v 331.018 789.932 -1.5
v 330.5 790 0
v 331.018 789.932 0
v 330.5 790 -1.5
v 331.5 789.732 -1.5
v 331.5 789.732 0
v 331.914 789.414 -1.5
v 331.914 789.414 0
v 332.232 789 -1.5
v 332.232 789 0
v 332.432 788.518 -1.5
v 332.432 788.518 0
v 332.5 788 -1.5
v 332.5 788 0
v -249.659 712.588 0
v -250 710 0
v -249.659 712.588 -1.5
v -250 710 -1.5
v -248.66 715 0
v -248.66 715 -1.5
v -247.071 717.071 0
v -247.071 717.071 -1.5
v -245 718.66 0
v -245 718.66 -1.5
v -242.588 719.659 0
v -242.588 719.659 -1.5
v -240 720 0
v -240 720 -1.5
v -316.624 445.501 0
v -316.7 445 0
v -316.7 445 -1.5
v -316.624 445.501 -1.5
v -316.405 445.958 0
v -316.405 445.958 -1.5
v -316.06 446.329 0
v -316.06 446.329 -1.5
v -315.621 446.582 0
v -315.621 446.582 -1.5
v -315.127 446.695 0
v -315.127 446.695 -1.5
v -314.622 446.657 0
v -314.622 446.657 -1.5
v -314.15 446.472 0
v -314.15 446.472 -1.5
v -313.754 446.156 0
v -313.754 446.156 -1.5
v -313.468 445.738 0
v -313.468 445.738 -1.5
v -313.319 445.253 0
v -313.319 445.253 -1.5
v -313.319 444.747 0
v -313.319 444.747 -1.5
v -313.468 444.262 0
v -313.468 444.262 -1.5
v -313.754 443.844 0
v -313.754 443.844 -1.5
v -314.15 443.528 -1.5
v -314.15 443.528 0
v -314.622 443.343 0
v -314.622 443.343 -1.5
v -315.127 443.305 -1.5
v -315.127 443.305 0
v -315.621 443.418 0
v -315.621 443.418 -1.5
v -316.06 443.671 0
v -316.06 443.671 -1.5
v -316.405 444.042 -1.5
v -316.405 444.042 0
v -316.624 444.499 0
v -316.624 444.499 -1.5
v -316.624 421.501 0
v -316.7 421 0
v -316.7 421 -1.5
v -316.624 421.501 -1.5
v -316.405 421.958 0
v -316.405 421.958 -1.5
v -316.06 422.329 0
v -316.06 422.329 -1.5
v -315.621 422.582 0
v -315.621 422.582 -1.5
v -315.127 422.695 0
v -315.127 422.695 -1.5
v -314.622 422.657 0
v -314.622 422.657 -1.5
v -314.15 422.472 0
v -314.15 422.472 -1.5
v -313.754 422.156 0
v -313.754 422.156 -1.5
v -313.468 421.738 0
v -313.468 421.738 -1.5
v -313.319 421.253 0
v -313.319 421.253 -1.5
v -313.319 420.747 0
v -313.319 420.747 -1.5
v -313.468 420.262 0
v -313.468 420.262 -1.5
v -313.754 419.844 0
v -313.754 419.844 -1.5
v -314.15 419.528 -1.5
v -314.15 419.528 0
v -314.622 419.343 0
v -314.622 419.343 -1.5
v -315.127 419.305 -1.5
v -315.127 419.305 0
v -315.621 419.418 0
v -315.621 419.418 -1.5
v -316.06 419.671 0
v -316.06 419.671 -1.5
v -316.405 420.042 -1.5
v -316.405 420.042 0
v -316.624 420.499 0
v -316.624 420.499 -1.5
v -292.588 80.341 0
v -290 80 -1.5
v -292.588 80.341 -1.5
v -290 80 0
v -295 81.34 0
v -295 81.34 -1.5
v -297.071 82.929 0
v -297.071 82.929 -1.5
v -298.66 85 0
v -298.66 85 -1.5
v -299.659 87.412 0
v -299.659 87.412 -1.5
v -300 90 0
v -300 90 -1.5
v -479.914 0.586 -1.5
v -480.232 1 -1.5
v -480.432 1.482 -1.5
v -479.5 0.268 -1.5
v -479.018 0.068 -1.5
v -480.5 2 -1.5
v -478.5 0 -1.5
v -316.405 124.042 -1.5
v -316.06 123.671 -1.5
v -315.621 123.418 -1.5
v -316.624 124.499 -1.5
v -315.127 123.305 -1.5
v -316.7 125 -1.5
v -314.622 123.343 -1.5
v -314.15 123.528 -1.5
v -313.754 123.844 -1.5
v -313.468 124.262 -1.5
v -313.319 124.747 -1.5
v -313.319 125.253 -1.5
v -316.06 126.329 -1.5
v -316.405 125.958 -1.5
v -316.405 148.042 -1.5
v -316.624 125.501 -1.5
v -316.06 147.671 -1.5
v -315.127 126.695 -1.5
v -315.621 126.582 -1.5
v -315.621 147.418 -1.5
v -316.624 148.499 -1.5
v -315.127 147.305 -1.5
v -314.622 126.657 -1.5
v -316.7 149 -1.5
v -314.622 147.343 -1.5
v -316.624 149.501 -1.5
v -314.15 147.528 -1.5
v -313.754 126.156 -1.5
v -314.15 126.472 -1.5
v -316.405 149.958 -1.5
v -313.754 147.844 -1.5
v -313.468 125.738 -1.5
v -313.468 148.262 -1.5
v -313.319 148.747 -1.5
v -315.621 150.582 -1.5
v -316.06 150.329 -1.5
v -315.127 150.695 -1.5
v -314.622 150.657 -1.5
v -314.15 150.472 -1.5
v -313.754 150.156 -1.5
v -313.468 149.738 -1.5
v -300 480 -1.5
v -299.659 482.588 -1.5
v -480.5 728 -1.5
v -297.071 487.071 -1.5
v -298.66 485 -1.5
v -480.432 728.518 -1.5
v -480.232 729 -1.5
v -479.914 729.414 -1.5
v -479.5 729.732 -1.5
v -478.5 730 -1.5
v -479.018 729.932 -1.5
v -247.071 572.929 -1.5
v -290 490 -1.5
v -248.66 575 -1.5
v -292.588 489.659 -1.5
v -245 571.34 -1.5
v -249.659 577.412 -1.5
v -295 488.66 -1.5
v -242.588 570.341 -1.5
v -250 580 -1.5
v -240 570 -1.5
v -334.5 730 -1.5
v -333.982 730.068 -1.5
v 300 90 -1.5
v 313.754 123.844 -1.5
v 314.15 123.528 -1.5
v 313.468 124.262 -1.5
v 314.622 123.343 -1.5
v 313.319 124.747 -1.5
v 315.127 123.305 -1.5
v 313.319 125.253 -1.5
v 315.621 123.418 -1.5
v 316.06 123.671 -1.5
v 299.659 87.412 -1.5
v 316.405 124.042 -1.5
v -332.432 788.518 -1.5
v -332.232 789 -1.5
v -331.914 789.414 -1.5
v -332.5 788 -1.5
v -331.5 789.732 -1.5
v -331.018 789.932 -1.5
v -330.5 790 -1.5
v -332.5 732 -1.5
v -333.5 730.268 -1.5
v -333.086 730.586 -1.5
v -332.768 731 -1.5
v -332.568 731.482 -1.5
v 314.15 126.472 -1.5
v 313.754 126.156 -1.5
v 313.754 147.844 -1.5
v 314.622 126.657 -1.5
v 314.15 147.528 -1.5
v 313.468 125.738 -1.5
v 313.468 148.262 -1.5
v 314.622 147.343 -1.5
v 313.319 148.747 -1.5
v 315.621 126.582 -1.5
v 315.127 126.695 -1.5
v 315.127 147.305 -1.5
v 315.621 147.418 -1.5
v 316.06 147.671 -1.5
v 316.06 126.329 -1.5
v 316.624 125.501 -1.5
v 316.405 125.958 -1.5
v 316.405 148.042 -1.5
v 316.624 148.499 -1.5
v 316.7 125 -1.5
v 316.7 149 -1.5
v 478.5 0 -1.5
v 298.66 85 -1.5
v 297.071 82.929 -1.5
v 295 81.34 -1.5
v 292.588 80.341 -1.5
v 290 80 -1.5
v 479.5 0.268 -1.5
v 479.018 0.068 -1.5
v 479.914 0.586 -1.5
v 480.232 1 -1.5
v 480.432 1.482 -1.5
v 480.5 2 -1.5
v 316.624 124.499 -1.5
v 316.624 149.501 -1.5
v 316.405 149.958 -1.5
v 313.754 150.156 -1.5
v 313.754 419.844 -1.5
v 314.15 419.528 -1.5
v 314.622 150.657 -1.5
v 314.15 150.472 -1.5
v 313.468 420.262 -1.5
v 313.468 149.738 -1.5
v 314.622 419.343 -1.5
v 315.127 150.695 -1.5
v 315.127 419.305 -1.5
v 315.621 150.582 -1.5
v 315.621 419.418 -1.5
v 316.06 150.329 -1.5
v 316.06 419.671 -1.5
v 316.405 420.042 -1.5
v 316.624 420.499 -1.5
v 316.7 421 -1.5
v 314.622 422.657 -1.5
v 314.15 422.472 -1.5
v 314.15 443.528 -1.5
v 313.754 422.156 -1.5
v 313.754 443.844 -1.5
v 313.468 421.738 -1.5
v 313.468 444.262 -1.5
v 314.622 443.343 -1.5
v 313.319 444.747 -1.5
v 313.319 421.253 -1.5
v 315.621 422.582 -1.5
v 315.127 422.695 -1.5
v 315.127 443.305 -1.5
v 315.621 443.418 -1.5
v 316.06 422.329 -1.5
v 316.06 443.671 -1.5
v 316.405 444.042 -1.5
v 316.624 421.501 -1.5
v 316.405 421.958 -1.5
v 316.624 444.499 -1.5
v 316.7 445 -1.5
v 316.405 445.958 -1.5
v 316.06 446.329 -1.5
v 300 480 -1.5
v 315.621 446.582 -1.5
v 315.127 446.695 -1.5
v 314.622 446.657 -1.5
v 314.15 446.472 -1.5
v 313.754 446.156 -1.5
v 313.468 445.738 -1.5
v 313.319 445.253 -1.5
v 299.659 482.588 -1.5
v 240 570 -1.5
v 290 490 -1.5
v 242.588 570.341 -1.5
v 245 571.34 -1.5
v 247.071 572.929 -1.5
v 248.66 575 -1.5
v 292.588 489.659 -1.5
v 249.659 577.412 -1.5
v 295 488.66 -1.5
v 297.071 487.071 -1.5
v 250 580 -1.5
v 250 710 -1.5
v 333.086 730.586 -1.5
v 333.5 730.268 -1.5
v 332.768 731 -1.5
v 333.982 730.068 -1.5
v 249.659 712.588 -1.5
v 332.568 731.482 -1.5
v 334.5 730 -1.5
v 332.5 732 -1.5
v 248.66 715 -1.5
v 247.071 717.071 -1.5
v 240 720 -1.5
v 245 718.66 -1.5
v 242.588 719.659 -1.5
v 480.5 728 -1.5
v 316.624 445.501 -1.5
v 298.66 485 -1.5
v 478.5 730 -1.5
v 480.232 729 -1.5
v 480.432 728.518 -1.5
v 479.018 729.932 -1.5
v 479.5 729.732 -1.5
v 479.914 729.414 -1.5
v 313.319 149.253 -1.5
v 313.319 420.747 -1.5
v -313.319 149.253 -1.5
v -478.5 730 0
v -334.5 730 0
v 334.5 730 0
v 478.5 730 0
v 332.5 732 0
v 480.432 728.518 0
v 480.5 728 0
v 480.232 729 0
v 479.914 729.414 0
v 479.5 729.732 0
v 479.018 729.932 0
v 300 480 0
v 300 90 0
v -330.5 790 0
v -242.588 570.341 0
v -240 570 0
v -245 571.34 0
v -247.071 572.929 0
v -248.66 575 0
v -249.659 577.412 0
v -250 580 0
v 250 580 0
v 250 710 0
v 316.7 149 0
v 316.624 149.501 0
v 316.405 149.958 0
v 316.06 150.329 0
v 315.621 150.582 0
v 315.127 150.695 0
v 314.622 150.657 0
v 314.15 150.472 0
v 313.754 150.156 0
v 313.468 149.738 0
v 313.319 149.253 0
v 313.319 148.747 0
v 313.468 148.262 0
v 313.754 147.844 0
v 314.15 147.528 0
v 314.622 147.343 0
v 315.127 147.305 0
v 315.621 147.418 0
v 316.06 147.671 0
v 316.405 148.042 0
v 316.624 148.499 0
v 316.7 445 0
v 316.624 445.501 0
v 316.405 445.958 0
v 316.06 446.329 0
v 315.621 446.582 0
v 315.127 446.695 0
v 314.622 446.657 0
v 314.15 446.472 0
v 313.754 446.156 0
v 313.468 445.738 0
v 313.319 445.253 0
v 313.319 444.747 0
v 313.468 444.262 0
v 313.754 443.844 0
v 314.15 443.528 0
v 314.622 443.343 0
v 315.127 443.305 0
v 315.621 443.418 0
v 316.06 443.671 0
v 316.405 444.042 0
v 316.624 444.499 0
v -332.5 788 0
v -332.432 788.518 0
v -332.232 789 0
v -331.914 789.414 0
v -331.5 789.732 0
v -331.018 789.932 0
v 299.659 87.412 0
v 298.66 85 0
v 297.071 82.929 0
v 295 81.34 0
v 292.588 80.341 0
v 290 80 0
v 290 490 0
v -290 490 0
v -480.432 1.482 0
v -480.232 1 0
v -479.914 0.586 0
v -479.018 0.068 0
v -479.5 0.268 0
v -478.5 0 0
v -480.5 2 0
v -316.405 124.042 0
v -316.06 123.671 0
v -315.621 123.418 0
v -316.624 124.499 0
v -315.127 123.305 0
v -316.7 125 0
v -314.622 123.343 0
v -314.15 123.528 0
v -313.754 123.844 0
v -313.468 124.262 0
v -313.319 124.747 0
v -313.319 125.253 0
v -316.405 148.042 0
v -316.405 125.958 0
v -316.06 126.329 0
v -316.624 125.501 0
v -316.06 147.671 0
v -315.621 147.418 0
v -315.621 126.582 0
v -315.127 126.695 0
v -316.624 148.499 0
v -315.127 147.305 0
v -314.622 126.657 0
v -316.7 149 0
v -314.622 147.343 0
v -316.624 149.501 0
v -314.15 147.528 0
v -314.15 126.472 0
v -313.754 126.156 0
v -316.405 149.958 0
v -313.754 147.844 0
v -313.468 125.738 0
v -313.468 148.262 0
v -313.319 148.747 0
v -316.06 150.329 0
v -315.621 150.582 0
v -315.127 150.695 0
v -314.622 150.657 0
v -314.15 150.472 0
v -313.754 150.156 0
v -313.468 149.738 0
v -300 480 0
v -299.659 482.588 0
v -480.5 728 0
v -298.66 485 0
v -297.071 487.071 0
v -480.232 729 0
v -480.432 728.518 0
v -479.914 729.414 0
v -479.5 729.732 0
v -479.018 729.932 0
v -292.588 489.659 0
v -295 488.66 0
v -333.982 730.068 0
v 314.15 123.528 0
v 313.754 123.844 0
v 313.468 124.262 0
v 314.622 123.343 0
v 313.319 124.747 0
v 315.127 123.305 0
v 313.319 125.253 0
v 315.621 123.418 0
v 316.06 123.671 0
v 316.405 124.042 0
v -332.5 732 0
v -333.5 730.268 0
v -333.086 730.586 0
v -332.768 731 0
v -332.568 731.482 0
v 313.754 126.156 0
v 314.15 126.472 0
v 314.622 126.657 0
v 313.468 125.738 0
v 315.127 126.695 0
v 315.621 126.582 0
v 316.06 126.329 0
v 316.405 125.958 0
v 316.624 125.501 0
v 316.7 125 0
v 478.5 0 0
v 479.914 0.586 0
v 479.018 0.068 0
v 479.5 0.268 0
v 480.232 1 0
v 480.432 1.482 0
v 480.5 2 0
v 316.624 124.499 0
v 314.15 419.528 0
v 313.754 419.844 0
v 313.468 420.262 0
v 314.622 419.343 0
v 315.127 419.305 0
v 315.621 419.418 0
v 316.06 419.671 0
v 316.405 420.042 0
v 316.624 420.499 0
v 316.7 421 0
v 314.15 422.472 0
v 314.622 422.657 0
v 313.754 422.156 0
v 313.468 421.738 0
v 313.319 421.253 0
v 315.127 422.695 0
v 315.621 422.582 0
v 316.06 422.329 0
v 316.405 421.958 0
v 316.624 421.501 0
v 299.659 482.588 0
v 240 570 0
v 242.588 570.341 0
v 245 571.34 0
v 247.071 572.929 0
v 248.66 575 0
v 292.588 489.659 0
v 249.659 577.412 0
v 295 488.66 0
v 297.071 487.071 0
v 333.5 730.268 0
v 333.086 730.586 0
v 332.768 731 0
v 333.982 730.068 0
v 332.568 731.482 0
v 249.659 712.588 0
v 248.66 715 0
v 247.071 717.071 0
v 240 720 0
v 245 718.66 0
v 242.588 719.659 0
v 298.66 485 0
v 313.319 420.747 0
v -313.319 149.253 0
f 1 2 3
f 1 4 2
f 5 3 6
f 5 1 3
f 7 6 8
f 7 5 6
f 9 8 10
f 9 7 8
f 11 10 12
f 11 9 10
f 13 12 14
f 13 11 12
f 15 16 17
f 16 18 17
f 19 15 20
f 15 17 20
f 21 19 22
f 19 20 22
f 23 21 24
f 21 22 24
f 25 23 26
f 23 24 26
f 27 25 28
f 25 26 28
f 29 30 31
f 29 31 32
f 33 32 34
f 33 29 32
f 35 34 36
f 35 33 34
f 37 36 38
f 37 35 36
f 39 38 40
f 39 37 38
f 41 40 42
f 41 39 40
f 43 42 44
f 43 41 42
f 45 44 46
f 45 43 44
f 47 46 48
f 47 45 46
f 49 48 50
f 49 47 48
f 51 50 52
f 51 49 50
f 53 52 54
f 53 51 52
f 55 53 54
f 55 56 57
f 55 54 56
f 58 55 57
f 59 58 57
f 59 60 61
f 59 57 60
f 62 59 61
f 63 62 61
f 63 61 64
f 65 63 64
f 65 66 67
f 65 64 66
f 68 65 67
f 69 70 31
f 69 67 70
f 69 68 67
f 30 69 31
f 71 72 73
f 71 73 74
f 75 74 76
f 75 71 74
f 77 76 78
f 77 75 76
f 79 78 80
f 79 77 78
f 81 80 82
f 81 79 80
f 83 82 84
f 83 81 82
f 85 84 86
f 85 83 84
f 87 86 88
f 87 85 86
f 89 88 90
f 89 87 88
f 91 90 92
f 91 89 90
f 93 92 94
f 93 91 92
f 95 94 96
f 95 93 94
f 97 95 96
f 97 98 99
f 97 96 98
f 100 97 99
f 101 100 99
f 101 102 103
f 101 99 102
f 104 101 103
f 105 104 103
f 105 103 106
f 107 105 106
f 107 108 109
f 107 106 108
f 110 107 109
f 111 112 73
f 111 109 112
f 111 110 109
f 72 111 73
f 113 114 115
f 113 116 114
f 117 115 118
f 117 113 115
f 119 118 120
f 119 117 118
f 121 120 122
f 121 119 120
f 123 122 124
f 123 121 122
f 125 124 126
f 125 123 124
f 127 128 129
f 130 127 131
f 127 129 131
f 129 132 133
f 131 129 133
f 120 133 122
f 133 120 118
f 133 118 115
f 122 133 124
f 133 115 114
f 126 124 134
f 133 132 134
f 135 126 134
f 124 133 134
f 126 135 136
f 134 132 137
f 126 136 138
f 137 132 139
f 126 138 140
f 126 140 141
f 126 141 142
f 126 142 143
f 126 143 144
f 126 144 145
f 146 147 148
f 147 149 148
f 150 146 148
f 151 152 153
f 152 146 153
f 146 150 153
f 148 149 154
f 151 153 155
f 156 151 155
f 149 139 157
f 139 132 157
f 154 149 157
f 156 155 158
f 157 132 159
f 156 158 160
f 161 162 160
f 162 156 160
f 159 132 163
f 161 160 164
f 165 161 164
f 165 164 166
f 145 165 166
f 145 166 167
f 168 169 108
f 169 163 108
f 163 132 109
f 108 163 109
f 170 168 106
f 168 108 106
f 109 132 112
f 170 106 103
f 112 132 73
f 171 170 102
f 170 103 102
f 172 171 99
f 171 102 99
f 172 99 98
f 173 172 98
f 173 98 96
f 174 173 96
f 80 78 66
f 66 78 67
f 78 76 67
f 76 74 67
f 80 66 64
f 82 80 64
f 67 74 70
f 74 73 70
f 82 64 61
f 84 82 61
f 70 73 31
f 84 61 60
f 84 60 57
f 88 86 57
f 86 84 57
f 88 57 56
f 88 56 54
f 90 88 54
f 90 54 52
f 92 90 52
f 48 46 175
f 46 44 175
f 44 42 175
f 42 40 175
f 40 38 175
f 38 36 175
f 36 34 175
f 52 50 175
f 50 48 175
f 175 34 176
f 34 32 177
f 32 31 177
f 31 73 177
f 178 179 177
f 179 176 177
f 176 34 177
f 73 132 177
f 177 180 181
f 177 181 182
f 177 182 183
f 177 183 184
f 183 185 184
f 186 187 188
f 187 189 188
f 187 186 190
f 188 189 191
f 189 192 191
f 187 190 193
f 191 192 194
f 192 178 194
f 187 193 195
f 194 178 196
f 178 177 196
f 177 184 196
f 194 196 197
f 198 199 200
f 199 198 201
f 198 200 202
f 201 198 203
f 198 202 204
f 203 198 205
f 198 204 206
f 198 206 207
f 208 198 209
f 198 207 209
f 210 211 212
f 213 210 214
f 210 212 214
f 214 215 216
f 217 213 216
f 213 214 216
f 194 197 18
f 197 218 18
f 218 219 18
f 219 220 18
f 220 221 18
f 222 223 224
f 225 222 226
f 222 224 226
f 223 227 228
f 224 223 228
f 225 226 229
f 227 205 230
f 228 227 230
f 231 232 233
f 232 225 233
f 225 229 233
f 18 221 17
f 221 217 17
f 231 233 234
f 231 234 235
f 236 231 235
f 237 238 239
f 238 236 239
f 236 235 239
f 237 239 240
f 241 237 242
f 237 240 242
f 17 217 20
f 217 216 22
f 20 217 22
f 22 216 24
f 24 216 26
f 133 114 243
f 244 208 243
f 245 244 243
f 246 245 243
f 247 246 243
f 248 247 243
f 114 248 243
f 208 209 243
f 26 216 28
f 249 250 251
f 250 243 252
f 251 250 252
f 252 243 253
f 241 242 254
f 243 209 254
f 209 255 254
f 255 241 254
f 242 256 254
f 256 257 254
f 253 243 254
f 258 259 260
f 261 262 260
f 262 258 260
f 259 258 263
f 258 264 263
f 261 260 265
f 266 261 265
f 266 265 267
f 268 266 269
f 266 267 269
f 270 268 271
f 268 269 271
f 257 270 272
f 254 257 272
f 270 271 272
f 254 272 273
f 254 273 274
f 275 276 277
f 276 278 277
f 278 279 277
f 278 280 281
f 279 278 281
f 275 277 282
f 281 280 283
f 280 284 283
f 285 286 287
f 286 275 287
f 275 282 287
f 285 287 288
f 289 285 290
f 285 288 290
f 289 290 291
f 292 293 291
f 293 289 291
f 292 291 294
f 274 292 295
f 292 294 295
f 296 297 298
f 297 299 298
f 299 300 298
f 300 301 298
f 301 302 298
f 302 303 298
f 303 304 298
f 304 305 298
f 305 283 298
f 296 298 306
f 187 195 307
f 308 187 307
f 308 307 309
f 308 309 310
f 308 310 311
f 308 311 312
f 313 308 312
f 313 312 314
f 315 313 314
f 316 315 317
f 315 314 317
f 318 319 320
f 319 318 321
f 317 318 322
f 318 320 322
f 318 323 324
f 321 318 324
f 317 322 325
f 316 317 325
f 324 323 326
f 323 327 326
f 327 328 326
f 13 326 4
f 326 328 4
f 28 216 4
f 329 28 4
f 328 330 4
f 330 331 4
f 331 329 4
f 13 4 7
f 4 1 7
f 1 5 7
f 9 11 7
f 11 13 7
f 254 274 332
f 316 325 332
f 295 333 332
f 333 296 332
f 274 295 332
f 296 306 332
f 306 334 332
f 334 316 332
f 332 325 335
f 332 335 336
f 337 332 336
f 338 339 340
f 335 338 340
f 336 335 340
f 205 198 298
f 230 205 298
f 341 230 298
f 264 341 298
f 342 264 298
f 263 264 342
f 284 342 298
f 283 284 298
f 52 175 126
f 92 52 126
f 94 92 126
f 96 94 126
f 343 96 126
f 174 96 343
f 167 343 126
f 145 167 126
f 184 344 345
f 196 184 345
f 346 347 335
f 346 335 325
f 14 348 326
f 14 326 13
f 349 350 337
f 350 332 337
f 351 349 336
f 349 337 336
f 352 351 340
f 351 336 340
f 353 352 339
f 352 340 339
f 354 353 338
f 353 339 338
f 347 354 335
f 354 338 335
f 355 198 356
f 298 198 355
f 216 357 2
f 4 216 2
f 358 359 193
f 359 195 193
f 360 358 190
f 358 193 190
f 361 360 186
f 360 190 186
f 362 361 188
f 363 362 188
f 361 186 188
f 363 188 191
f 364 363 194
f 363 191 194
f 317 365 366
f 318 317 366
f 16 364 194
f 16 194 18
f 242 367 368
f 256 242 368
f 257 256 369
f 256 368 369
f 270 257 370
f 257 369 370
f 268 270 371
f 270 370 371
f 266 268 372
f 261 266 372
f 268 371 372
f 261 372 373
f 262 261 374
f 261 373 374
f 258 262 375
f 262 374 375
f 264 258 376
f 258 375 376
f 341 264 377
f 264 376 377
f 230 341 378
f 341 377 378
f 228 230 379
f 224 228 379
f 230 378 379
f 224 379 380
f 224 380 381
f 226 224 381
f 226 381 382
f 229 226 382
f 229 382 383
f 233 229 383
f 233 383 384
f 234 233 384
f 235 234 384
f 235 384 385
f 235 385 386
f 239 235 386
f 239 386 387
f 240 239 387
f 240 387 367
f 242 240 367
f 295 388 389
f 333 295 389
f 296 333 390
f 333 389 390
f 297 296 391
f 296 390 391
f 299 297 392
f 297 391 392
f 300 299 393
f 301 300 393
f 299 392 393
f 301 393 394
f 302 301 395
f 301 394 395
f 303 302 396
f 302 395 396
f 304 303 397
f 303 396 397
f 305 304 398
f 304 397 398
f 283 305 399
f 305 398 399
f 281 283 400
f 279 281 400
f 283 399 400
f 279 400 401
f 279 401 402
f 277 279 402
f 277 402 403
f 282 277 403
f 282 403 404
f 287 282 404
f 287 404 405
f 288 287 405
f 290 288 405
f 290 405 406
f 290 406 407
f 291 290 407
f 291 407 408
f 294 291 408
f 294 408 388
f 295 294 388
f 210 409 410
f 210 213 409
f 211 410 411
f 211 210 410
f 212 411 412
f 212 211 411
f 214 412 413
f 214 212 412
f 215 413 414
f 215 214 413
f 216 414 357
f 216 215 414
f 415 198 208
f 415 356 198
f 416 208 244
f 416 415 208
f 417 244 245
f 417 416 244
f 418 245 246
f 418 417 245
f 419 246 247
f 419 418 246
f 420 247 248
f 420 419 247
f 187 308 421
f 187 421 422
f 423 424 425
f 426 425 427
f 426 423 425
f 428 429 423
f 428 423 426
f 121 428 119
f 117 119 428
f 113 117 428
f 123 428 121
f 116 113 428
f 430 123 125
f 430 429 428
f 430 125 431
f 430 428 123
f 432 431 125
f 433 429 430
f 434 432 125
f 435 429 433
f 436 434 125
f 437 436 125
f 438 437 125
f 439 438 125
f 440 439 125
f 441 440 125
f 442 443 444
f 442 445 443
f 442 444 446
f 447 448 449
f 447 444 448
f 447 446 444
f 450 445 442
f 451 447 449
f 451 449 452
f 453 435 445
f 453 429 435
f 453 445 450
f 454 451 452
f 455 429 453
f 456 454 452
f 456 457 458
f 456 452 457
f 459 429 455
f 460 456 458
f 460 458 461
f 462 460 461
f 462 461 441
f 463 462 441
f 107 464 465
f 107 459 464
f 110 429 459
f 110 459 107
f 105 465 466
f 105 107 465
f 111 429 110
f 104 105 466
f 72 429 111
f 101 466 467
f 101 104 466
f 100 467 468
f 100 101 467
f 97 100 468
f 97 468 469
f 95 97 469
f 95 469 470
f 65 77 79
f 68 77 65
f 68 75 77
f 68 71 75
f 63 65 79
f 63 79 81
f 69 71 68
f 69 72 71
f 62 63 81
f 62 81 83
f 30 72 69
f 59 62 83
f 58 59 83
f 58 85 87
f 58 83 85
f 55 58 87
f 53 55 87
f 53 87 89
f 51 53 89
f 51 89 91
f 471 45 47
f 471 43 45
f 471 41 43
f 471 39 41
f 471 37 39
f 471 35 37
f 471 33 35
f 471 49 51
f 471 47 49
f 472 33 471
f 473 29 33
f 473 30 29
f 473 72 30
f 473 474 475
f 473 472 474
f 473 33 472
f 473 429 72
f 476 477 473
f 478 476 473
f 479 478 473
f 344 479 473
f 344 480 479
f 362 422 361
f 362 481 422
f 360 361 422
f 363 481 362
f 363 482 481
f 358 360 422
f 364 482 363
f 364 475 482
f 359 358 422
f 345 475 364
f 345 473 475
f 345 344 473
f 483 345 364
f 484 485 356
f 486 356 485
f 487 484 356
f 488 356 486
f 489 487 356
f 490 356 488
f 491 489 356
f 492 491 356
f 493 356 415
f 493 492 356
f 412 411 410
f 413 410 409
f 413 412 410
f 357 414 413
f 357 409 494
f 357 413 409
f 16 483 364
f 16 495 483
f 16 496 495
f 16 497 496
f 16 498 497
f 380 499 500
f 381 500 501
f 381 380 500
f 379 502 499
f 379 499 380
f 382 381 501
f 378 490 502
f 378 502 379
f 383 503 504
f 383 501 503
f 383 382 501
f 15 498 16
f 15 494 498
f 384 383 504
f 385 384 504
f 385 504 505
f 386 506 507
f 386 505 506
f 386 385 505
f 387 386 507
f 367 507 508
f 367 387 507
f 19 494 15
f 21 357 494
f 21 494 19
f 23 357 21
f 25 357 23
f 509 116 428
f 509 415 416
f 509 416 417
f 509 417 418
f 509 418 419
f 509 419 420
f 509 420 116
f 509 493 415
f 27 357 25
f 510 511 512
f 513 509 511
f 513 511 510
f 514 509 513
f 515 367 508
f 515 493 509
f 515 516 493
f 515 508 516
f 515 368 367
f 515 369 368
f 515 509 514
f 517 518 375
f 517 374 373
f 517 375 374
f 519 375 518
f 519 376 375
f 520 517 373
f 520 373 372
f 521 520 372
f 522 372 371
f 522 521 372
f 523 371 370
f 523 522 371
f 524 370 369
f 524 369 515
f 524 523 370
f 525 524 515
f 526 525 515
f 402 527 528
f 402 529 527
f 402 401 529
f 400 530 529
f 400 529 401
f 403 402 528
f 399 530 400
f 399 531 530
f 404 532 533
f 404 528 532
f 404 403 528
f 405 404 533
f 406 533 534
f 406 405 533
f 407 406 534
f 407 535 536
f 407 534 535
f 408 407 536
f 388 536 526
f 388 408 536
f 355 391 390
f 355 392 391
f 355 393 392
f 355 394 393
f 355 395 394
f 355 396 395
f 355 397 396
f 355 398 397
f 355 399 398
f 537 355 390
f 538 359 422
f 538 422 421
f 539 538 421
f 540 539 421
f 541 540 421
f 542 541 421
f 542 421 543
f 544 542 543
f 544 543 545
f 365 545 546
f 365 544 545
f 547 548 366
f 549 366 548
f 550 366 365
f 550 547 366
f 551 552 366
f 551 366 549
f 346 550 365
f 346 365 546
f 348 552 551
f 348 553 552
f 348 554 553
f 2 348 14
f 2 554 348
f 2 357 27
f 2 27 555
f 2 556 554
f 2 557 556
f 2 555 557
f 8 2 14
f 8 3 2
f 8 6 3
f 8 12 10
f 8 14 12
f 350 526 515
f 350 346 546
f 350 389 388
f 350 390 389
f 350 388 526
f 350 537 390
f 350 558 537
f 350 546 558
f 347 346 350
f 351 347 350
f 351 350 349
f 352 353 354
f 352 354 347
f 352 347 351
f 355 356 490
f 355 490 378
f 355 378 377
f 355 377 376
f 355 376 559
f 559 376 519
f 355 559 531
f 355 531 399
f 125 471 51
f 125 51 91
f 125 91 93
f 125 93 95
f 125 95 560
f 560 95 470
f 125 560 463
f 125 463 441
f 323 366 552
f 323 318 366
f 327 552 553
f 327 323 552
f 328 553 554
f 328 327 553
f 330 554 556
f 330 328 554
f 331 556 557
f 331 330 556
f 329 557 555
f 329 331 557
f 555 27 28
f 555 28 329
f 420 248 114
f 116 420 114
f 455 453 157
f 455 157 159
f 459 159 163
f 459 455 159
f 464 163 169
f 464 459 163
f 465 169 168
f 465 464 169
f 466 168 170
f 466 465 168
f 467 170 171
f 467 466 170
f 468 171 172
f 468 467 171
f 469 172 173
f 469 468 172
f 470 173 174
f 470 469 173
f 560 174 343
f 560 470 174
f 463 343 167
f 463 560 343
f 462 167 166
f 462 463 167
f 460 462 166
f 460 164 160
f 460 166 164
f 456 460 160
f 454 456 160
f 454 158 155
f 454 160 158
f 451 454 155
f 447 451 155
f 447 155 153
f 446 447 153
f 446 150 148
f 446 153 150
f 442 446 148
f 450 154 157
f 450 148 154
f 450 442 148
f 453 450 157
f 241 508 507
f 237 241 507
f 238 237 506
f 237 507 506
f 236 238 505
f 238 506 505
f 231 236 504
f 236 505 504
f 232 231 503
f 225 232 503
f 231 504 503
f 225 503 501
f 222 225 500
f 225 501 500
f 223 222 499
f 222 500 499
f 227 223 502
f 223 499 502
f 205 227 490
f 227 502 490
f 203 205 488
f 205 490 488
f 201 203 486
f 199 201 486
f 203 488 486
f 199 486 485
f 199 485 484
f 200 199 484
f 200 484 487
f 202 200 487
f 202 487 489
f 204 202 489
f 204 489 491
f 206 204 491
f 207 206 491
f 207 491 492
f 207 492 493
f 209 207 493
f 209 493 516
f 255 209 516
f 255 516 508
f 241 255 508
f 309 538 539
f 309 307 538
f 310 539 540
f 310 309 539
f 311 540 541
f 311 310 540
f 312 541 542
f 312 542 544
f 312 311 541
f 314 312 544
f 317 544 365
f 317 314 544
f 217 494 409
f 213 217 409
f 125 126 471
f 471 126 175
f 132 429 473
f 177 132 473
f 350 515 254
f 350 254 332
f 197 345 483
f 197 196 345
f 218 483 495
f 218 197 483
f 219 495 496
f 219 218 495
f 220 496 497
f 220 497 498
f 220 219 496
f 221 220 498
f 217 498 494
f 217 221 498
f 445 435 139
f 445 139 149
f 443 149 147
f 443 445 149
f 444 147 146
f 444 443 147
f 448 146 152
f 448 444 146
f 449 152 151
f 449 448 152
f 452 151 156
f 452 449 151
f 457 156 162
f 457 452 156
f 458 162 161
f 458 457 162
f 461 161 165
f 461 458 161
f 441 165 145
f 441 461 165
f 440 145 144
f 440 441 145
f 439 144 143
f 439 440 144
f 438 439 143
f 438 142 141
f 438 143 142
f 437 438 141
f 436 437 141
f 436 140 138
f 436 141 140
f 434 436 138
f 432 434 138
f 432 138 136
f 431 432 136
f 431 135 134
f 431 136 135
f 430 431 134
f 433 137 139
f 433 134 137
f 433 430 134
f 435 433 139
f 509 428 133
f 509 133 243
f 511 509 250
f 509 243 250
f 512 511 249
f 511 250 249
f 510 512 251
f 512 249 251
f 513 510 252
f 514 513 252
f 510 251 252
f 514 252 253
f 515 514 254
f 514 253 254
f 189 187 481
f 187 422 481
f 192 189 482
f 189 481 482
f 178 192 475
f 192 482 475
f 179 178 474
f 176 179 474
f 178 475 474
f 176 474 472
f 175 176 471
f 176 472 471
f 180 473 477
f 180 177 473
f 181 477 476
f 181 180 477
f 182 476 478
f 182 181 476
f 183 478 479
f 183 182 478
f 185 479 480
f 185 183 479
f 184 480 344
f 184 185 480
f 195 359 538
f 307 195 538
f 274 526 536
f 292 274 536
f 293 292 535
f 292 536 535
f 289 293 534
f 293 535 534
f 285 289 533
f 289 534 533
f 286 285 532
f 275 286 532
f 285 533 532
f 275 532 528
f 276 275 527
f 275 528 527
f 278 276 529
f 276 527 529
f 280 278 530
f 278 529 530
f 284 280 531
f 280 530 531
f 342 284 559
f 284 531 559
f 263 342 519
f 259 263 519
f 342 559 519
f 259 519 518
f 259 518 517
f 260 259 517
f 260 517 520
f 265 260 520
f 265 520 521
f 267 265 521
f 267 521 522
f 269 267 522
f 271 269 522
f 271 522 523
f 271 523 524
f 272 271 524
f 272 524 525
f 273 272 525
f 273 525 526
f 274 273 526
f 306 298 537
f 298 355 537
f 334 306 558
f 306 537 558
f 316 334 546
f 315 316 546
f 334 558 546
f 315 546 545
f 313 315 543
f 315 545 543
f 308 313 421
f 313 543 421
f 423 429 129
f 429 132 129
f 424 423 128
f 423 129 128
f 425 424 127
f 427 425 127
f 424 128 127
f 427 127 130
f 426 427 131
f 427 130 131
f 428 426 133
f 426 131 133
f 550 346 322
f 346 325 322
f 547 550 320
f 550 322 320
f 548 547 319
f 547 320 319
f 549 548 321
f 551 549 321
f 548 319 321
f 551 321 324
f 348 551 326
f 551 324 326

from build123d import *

# Parameters (mm, degrees)
SKETCH1_W            = 961
SKETCH1_H            = 790
SKETCH1_W_2          = 500
SKETCH1_H_2          = 150
BASE_FLANGE1_DEPTH   = 1.5
CUT_EXTRUDE1_REACH   = 926.653
SKETCH2_W            = 148
SKETCH2_H            = 60
CUT_EXTRUDE2_REACH   = 926.653
SKETCH3_W            = 600
SKETCH3_H            = 410
M3_CLEARANCE_HOLE1_D = 3.4
FILLET1_R            = 10
FILLET2_R            = 2


# Sheet-metal steps are written as plain solids
with BuildPart() as part:
    # Sketch1 → Base-Flange1 (new body)
    with BuildSketch(Plane.XY):
        with Locations((0, 395)):
            Rectangle(SKETCH1_W, SKETCH1_H)
        with Locations((0, 645)):
            Rectangle(SKETCH1_W_2, SKETCH1_H_2, mode=Mode.SUBTRACT)
    extrude(amount=-BASE_FLANGE1_DEPTH)

    # Sketch2 → Cut-Extrude1 (cut, up to next)
    with BuildSketch(Plane.XY, mode=Mode.PRIVATE) as cut_extrude1_sk1:
        with Locations((-406.5, 760)):
            Rectangle(SKETCH2_W, SKETCH2_H)
    cut_extrude1_tool1 = extrude(cut_extrude1_sk1.sketch, amount=-CUT_EXTRUDE1_REACH, mode=Mode.PRIVATE) & part.part
    cut_extrude1 = cut_extrude1_tool1.solids().sort_by_distance((-406.5, 760, 0))[0]
    add(cut_extrude1, mode=Mode.SUBTRACT)

    # Mirror1: Cut-Extrude1 across plane
    add(cut_extrude1.mirror(Plane(origin=(0, 0, 0), x_dir=(0, 0, 1), z_dir=(1, 0, 0))), mode=Mode.SUBTRACT)

    # Sketch3 → Cut-Extrude2 (cut, up to next)
    with BuildSketch(Plane(origin=(0, 0, -1.5), x_dir=(-1, 0, 0), z_dir=(0, 0, -1)), mode=Mode.PRIVATE) as cut_extrude2_sk1:
        with Locations((0, 285)):
            Rectangle(SKETCH3_W, SKETCH3_H)
    cut_extrude2_tool1 = extrude(cut_extrude2_sk1.sketch, amount=-CUT_EXTRUDE2_REACH, mode=Mode.PRIVATE) & part.part
    add(cut_extrude2_tool1.solids().sort_by_distance((0, 285, -1.5))[0], mode=Mode.SUBTRACT)

    # M3 Clearance Hole1 (through all)
    with Locations(Plane(origin=(0, 0, -1.5), x_dir=(-1, 0, 0), z_dir=(0, 0, -1))):
        with Locations((-315, 125), (-315, 149), (-315, 445), (-315, 421)):
            m3_clearance_hole1 = Hole(M3_CLEARANCE_HOLE1_D / 2)

    # Mirror2: M3 Clearance Hole1 across plane
    add(m3_clearance_hole1.mirror(Plane(origin=(0, 0, 0), x_dir=(0, 0, 1), z_dir=(1, 0, 0))), mode=Mode.SUBTRACT)

    # Fillet1
    fillet1_edges = [part.edges().sort_by_distance(p)[0] for p in [
        (-250, 720, -0.75),
        (250, 720, -0.75),
        (250, 570, -0.75),
        (-250, 570, -0.75),
        (-300, 490, -0.75),
        (-300, 80, -0.75),
        (300, 80, -0.75),
        (300, 490, -0.75),
    ]]
    fillet(fillet1_edges, radius=FILLET1_R)

    # Fillet2
    fillet2_edges = [part.edges().sort_by_distance(p)[0] for p in [
        (-480.5, 730, -0.75),
        (-332.5, 790, -0.75),
        (-332.5, 730, -0.75),
        (480.5, 730, -0.75),
        (332.5, 730, -0.75),
        (332.5, 790, -0.75),
        (480.5, 0, -0.75),
        (-480.5, 0, -0.75),
    ]]
    fillet(fillet2_edges, radius=FILLET2_R)


solid = part.part
